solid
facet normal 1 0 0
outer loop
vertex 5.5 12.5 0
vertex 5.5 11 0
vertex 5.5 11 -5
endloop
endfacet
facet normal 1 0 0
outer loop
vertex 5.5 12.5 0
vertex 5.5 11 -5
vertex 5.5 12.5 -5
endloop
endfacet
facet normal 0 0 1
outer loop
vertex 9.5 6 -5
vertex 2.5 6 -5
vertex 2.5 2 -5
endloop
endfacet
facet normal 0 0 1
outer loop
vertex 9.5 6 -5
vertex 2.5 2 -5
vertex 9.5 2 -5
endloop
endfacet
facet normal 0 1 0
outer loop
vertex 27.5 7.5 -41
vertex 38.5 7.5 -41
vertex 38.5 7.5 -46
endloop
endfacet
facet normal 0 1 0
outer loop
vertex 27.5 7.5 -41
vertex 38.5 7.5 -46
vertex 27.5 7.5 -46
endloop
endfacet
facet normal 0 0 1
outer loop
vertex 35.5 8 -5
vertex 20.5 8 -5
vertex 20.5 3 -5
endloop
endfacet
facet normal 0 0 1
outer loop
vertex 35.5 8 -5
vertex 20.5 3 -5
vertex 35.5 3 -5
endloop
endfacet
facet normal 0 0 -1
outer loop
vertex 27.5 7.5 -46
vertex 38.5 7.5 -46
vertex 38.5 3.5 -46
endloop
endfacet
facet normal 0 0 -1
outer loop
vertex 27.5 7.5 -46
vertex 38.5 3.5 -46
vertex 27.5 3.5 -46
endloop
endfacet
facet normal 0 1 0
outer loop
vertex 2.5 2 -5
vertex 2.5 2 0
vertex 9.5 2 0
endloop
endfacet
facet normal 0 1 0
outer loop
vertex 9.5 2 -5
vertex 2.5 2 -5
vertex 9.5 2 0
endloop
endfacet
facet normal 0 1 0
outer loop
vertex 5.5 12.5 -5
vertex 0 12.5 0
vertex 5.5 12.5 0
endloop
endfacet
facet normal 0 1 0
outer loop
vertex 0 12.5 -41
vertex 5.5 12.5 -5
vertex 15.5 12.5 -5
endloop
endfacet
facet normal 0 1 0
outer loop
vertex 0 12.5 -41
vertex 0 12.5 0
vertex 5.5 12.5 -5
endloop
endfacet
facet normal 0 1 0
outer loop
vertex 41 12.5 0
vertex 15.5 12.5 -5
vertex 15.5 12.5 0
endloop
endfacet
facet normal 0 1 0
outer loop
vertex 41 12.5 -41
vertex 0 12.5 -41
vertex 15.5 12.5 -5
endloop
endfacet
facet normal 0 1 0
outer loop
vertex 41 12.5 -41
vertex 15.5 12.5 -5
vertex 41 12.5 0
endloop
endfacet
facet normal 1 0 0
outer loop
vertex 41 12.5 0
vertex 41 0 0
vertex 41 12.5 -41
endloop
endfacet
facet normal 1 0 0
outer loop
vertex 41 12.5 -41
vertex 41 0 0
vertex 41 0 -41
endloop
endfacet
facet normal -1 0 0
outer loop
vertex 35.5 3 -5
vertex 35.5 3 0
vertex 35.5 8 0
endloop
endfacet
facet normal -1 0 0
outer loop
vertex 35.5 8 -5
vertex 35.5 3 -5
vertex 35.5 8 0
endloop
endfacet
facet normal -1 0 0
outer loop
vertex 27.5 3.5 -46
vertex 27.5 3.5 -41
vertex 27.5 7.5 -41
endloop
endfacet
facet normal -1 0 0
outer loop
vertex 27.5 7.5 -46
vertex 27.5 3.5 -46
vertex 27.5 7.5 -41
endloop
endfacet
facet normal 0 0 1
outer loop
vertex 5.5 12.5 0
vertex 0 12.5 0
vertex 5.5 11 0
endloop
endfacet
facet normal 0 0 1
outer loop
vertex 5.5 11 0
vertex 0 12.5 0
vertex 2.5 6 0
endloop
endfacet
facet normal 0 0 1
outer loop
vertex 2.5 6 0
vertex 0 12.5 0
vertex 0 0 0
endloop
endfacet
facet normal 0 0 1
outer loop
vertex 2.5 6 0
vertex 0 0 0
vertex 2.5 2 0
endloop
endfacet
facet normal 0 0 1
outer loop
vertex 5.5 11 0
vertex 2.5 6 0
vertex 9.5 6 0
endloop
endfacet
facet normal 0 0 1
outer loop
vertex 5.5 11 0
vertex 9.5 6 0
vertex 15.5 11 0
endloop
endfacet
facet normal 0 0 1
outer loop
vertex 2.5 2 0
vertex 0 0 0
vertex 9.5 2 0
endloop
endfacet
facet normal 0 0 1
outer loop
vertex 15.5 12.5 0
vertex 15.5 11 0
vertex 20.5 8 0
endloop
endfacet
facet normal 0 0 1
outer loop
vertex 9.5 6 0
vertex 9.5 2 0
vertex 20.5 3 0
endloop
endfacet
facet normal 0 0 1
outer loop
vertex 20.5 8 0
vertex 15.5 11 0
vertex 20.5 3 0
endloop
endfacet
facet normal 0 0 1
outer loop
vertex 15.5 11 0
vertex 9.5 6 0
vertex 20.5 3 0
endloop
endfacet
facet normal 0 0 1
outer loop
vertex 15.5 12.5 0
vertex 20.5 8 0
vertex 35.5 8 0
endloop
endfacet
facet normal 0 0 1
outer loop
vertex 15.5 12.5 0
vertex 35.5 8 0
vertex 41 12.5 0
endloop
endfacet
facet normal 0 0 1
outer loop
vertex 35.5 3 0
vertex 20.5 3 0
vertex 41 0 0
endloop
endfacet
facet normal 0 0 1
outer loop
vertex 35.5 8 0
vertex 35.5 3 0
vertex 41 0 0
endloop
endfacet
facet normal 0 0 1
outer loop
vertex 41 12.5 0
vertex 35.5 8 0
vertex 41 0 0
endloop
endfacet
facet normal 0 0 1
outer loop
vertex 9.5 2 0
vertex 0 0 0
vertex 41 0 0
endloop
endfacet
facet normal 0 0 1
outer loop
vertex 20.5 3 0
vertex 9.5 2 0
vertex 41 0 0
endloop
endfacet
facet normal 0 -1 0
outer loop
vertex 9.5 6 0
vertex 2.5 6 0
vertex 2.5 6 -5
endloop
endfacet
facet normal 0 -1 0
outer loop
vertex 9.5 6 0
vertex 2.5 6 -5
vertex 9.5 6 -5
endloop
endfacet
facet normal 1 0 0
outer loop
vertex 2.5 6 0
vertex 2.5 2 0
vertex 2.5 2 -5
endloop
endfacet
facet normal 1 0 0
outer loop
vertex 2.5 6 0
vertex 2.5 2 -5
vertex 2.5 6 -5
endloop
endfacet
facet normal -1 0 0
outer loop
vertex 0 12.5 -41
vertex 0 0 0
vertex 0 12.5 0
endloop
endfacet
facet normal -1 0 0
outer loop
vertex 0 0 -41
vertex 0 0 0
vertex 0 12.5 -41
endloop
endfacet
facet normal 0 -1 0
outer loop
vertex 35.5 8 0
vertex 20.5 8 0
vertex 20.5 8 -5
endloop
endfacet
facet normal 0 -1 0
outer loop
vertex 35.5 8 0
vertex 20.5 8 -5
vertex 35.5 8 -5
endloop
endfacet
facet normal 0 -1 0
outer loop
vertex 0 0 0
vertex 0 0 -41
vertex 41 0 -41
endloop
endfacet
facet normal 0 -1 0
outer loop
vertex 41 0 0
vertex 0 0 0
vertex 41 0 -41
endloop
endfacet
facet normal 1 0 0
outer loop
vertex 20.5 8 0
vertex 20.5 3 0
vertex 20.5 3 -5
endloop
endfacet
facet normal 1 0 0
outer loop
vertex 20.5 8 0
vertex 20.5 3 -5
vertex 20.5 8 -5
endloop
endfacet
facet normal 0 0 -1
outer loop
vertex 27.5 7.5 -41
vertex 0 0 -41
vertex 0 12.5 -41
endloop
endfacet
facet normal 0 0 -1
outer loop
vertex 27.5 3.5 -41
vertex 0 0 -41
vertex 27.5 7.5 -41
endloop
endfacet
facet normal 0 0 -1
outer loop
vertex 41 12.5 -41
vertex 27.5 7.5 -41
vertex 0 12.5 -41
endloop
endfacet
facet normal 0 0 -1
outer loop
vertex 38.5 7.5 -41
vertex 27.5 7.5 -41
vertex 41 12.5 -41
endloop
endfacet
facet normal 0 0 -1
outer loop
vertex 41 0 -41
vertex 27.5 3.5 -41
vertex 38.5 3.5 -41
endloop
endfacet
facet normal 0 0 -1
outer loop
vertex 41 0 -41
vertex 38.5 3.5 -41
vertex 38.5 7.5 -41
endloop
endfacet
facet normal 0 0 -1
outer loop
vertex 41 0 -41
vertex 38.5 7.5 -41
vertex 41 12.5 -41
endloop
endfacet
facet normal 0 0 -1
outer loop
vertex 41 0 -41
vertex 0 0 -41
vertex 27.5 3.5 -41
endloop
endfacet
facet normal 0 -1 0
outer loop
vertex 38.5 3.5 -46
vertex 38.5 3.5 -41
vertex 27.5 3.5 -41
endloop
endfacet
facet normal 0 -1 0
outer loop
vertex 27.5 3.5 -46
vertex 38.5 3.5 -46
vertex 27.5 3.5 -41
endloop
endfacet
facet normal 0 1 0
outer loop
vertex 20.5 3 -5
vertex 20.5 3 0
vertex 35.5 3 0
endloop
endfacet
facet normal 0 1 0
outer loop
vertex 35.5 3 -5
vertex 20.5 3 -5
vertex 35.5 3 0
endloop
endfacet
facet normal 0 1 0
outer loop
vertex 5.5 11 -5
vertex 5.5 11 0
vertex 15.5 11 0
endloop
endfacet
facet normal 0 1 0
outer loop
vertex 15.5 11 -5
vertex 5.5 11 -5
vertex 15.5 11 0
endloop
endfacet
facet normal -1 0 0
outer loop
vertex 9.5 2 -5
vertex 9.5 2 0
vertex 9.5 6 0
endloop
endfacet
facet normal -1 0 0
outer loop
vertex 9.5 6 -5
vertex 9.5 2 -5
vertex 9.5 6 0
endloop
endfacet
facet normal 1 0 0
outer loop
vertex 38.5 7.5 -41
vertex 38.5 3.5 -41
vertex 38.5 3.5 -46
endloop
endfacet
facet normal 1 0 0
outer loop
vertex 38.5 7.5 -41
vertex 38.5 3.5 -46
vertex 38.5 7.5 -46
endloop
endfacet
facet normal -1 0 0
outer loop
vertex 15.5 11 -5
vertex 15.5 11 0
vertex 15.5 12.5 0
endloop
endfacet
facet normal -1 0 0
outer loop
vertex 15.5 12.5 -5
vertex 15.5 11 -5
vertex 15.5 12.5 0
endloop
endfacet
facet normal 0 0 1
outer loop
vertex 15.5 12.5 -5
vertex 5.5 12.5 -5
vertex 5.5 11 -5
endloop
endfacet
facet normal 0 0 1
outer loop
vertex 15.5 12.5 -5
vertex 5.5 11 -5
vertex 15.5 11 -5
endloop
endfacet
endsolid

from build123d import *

# Parameters (mm, degrees)
SKETCH1_W           = 41
SKETCH1_H           = 41
BOSS_EXTRUDE1_DEPTH = 12.5
SKETCH2_W           = 10
SKETCH2_H           = 1.5
CUT_EXTRUDE1_DEPTH  = 5
SKETCH3_W           = 7
SKETCH3_H           = 4
CUT_EXTRUDE2_DEPTH  = 5
SKETCH4_W           = 15
SKETCH4_H           = 5
CUT_EXTRUDE3_DEPTH  = 5
SKETCH5_W           = 11
SKETCH5_H           = 4
BOSS_EXTRUDE2_DEPTH = 5


with BuildPart() as part:
    # Sketch1 → Boss-Extrude1 (new body)
    with BuildSketch(Plane(origin=(0, 0, 0), x_dir=(1, 0, 0), z_dir=(0, 1, 0))):
        with Locations((20.5, 20.5)):
            Rectangle(SKETCH1_W, SKETCH1_H)
    extrude(amount=BOSS_EXTRUDE1_DEPTH)

    # Sketch2 → Cut-Extrude1 (cut)
    with BuildSketch(Plane.XY):
        with Locations((10.5, 11.75)):
            Rectangle(SKETCH2_W, SKETCH2_H)
    extrude(amount=-CUT_EXTRUDE1_DEPTH, mode=Mode.SUBTRACT)

    # Sketch3 → Cut-Extrude2 (cut)
    with BuildSketch(Plane.XY):
        with Locations((6, 4)):
            Rectangle(SKETCH3_W, SKETCH3_H)
    extrude(amount=-CUT_EXTRUDE2_DEPTH, mode=Mode.SUBTRACT)

    # Sketch4 → Cut-Extrude3 (cut)
    with BuildSketch(Plane.XY):
        with Locations((28, 5.5)):
            Rectangle(SKETCH4_W, SKETCH4_H)
    extrude(amount=-CUT_EXTRUDE3_DEPTH, mode=Mode.SUBTRACT)

    # Sketch5 → Boss-Extrude2 (add)
    with BuildSketch(Plane(origin=(0, 0, -41), x_dir=(-1, 0, 0), z_dir=(0, 0, -1))):
        with Locations((-33, 5.5)):
            Rectangle(SKETCH5_W, SKETCH5_H)
    extrude(amount=BOSS_EXTRUDE2_DEPTH)


solid = part.part
